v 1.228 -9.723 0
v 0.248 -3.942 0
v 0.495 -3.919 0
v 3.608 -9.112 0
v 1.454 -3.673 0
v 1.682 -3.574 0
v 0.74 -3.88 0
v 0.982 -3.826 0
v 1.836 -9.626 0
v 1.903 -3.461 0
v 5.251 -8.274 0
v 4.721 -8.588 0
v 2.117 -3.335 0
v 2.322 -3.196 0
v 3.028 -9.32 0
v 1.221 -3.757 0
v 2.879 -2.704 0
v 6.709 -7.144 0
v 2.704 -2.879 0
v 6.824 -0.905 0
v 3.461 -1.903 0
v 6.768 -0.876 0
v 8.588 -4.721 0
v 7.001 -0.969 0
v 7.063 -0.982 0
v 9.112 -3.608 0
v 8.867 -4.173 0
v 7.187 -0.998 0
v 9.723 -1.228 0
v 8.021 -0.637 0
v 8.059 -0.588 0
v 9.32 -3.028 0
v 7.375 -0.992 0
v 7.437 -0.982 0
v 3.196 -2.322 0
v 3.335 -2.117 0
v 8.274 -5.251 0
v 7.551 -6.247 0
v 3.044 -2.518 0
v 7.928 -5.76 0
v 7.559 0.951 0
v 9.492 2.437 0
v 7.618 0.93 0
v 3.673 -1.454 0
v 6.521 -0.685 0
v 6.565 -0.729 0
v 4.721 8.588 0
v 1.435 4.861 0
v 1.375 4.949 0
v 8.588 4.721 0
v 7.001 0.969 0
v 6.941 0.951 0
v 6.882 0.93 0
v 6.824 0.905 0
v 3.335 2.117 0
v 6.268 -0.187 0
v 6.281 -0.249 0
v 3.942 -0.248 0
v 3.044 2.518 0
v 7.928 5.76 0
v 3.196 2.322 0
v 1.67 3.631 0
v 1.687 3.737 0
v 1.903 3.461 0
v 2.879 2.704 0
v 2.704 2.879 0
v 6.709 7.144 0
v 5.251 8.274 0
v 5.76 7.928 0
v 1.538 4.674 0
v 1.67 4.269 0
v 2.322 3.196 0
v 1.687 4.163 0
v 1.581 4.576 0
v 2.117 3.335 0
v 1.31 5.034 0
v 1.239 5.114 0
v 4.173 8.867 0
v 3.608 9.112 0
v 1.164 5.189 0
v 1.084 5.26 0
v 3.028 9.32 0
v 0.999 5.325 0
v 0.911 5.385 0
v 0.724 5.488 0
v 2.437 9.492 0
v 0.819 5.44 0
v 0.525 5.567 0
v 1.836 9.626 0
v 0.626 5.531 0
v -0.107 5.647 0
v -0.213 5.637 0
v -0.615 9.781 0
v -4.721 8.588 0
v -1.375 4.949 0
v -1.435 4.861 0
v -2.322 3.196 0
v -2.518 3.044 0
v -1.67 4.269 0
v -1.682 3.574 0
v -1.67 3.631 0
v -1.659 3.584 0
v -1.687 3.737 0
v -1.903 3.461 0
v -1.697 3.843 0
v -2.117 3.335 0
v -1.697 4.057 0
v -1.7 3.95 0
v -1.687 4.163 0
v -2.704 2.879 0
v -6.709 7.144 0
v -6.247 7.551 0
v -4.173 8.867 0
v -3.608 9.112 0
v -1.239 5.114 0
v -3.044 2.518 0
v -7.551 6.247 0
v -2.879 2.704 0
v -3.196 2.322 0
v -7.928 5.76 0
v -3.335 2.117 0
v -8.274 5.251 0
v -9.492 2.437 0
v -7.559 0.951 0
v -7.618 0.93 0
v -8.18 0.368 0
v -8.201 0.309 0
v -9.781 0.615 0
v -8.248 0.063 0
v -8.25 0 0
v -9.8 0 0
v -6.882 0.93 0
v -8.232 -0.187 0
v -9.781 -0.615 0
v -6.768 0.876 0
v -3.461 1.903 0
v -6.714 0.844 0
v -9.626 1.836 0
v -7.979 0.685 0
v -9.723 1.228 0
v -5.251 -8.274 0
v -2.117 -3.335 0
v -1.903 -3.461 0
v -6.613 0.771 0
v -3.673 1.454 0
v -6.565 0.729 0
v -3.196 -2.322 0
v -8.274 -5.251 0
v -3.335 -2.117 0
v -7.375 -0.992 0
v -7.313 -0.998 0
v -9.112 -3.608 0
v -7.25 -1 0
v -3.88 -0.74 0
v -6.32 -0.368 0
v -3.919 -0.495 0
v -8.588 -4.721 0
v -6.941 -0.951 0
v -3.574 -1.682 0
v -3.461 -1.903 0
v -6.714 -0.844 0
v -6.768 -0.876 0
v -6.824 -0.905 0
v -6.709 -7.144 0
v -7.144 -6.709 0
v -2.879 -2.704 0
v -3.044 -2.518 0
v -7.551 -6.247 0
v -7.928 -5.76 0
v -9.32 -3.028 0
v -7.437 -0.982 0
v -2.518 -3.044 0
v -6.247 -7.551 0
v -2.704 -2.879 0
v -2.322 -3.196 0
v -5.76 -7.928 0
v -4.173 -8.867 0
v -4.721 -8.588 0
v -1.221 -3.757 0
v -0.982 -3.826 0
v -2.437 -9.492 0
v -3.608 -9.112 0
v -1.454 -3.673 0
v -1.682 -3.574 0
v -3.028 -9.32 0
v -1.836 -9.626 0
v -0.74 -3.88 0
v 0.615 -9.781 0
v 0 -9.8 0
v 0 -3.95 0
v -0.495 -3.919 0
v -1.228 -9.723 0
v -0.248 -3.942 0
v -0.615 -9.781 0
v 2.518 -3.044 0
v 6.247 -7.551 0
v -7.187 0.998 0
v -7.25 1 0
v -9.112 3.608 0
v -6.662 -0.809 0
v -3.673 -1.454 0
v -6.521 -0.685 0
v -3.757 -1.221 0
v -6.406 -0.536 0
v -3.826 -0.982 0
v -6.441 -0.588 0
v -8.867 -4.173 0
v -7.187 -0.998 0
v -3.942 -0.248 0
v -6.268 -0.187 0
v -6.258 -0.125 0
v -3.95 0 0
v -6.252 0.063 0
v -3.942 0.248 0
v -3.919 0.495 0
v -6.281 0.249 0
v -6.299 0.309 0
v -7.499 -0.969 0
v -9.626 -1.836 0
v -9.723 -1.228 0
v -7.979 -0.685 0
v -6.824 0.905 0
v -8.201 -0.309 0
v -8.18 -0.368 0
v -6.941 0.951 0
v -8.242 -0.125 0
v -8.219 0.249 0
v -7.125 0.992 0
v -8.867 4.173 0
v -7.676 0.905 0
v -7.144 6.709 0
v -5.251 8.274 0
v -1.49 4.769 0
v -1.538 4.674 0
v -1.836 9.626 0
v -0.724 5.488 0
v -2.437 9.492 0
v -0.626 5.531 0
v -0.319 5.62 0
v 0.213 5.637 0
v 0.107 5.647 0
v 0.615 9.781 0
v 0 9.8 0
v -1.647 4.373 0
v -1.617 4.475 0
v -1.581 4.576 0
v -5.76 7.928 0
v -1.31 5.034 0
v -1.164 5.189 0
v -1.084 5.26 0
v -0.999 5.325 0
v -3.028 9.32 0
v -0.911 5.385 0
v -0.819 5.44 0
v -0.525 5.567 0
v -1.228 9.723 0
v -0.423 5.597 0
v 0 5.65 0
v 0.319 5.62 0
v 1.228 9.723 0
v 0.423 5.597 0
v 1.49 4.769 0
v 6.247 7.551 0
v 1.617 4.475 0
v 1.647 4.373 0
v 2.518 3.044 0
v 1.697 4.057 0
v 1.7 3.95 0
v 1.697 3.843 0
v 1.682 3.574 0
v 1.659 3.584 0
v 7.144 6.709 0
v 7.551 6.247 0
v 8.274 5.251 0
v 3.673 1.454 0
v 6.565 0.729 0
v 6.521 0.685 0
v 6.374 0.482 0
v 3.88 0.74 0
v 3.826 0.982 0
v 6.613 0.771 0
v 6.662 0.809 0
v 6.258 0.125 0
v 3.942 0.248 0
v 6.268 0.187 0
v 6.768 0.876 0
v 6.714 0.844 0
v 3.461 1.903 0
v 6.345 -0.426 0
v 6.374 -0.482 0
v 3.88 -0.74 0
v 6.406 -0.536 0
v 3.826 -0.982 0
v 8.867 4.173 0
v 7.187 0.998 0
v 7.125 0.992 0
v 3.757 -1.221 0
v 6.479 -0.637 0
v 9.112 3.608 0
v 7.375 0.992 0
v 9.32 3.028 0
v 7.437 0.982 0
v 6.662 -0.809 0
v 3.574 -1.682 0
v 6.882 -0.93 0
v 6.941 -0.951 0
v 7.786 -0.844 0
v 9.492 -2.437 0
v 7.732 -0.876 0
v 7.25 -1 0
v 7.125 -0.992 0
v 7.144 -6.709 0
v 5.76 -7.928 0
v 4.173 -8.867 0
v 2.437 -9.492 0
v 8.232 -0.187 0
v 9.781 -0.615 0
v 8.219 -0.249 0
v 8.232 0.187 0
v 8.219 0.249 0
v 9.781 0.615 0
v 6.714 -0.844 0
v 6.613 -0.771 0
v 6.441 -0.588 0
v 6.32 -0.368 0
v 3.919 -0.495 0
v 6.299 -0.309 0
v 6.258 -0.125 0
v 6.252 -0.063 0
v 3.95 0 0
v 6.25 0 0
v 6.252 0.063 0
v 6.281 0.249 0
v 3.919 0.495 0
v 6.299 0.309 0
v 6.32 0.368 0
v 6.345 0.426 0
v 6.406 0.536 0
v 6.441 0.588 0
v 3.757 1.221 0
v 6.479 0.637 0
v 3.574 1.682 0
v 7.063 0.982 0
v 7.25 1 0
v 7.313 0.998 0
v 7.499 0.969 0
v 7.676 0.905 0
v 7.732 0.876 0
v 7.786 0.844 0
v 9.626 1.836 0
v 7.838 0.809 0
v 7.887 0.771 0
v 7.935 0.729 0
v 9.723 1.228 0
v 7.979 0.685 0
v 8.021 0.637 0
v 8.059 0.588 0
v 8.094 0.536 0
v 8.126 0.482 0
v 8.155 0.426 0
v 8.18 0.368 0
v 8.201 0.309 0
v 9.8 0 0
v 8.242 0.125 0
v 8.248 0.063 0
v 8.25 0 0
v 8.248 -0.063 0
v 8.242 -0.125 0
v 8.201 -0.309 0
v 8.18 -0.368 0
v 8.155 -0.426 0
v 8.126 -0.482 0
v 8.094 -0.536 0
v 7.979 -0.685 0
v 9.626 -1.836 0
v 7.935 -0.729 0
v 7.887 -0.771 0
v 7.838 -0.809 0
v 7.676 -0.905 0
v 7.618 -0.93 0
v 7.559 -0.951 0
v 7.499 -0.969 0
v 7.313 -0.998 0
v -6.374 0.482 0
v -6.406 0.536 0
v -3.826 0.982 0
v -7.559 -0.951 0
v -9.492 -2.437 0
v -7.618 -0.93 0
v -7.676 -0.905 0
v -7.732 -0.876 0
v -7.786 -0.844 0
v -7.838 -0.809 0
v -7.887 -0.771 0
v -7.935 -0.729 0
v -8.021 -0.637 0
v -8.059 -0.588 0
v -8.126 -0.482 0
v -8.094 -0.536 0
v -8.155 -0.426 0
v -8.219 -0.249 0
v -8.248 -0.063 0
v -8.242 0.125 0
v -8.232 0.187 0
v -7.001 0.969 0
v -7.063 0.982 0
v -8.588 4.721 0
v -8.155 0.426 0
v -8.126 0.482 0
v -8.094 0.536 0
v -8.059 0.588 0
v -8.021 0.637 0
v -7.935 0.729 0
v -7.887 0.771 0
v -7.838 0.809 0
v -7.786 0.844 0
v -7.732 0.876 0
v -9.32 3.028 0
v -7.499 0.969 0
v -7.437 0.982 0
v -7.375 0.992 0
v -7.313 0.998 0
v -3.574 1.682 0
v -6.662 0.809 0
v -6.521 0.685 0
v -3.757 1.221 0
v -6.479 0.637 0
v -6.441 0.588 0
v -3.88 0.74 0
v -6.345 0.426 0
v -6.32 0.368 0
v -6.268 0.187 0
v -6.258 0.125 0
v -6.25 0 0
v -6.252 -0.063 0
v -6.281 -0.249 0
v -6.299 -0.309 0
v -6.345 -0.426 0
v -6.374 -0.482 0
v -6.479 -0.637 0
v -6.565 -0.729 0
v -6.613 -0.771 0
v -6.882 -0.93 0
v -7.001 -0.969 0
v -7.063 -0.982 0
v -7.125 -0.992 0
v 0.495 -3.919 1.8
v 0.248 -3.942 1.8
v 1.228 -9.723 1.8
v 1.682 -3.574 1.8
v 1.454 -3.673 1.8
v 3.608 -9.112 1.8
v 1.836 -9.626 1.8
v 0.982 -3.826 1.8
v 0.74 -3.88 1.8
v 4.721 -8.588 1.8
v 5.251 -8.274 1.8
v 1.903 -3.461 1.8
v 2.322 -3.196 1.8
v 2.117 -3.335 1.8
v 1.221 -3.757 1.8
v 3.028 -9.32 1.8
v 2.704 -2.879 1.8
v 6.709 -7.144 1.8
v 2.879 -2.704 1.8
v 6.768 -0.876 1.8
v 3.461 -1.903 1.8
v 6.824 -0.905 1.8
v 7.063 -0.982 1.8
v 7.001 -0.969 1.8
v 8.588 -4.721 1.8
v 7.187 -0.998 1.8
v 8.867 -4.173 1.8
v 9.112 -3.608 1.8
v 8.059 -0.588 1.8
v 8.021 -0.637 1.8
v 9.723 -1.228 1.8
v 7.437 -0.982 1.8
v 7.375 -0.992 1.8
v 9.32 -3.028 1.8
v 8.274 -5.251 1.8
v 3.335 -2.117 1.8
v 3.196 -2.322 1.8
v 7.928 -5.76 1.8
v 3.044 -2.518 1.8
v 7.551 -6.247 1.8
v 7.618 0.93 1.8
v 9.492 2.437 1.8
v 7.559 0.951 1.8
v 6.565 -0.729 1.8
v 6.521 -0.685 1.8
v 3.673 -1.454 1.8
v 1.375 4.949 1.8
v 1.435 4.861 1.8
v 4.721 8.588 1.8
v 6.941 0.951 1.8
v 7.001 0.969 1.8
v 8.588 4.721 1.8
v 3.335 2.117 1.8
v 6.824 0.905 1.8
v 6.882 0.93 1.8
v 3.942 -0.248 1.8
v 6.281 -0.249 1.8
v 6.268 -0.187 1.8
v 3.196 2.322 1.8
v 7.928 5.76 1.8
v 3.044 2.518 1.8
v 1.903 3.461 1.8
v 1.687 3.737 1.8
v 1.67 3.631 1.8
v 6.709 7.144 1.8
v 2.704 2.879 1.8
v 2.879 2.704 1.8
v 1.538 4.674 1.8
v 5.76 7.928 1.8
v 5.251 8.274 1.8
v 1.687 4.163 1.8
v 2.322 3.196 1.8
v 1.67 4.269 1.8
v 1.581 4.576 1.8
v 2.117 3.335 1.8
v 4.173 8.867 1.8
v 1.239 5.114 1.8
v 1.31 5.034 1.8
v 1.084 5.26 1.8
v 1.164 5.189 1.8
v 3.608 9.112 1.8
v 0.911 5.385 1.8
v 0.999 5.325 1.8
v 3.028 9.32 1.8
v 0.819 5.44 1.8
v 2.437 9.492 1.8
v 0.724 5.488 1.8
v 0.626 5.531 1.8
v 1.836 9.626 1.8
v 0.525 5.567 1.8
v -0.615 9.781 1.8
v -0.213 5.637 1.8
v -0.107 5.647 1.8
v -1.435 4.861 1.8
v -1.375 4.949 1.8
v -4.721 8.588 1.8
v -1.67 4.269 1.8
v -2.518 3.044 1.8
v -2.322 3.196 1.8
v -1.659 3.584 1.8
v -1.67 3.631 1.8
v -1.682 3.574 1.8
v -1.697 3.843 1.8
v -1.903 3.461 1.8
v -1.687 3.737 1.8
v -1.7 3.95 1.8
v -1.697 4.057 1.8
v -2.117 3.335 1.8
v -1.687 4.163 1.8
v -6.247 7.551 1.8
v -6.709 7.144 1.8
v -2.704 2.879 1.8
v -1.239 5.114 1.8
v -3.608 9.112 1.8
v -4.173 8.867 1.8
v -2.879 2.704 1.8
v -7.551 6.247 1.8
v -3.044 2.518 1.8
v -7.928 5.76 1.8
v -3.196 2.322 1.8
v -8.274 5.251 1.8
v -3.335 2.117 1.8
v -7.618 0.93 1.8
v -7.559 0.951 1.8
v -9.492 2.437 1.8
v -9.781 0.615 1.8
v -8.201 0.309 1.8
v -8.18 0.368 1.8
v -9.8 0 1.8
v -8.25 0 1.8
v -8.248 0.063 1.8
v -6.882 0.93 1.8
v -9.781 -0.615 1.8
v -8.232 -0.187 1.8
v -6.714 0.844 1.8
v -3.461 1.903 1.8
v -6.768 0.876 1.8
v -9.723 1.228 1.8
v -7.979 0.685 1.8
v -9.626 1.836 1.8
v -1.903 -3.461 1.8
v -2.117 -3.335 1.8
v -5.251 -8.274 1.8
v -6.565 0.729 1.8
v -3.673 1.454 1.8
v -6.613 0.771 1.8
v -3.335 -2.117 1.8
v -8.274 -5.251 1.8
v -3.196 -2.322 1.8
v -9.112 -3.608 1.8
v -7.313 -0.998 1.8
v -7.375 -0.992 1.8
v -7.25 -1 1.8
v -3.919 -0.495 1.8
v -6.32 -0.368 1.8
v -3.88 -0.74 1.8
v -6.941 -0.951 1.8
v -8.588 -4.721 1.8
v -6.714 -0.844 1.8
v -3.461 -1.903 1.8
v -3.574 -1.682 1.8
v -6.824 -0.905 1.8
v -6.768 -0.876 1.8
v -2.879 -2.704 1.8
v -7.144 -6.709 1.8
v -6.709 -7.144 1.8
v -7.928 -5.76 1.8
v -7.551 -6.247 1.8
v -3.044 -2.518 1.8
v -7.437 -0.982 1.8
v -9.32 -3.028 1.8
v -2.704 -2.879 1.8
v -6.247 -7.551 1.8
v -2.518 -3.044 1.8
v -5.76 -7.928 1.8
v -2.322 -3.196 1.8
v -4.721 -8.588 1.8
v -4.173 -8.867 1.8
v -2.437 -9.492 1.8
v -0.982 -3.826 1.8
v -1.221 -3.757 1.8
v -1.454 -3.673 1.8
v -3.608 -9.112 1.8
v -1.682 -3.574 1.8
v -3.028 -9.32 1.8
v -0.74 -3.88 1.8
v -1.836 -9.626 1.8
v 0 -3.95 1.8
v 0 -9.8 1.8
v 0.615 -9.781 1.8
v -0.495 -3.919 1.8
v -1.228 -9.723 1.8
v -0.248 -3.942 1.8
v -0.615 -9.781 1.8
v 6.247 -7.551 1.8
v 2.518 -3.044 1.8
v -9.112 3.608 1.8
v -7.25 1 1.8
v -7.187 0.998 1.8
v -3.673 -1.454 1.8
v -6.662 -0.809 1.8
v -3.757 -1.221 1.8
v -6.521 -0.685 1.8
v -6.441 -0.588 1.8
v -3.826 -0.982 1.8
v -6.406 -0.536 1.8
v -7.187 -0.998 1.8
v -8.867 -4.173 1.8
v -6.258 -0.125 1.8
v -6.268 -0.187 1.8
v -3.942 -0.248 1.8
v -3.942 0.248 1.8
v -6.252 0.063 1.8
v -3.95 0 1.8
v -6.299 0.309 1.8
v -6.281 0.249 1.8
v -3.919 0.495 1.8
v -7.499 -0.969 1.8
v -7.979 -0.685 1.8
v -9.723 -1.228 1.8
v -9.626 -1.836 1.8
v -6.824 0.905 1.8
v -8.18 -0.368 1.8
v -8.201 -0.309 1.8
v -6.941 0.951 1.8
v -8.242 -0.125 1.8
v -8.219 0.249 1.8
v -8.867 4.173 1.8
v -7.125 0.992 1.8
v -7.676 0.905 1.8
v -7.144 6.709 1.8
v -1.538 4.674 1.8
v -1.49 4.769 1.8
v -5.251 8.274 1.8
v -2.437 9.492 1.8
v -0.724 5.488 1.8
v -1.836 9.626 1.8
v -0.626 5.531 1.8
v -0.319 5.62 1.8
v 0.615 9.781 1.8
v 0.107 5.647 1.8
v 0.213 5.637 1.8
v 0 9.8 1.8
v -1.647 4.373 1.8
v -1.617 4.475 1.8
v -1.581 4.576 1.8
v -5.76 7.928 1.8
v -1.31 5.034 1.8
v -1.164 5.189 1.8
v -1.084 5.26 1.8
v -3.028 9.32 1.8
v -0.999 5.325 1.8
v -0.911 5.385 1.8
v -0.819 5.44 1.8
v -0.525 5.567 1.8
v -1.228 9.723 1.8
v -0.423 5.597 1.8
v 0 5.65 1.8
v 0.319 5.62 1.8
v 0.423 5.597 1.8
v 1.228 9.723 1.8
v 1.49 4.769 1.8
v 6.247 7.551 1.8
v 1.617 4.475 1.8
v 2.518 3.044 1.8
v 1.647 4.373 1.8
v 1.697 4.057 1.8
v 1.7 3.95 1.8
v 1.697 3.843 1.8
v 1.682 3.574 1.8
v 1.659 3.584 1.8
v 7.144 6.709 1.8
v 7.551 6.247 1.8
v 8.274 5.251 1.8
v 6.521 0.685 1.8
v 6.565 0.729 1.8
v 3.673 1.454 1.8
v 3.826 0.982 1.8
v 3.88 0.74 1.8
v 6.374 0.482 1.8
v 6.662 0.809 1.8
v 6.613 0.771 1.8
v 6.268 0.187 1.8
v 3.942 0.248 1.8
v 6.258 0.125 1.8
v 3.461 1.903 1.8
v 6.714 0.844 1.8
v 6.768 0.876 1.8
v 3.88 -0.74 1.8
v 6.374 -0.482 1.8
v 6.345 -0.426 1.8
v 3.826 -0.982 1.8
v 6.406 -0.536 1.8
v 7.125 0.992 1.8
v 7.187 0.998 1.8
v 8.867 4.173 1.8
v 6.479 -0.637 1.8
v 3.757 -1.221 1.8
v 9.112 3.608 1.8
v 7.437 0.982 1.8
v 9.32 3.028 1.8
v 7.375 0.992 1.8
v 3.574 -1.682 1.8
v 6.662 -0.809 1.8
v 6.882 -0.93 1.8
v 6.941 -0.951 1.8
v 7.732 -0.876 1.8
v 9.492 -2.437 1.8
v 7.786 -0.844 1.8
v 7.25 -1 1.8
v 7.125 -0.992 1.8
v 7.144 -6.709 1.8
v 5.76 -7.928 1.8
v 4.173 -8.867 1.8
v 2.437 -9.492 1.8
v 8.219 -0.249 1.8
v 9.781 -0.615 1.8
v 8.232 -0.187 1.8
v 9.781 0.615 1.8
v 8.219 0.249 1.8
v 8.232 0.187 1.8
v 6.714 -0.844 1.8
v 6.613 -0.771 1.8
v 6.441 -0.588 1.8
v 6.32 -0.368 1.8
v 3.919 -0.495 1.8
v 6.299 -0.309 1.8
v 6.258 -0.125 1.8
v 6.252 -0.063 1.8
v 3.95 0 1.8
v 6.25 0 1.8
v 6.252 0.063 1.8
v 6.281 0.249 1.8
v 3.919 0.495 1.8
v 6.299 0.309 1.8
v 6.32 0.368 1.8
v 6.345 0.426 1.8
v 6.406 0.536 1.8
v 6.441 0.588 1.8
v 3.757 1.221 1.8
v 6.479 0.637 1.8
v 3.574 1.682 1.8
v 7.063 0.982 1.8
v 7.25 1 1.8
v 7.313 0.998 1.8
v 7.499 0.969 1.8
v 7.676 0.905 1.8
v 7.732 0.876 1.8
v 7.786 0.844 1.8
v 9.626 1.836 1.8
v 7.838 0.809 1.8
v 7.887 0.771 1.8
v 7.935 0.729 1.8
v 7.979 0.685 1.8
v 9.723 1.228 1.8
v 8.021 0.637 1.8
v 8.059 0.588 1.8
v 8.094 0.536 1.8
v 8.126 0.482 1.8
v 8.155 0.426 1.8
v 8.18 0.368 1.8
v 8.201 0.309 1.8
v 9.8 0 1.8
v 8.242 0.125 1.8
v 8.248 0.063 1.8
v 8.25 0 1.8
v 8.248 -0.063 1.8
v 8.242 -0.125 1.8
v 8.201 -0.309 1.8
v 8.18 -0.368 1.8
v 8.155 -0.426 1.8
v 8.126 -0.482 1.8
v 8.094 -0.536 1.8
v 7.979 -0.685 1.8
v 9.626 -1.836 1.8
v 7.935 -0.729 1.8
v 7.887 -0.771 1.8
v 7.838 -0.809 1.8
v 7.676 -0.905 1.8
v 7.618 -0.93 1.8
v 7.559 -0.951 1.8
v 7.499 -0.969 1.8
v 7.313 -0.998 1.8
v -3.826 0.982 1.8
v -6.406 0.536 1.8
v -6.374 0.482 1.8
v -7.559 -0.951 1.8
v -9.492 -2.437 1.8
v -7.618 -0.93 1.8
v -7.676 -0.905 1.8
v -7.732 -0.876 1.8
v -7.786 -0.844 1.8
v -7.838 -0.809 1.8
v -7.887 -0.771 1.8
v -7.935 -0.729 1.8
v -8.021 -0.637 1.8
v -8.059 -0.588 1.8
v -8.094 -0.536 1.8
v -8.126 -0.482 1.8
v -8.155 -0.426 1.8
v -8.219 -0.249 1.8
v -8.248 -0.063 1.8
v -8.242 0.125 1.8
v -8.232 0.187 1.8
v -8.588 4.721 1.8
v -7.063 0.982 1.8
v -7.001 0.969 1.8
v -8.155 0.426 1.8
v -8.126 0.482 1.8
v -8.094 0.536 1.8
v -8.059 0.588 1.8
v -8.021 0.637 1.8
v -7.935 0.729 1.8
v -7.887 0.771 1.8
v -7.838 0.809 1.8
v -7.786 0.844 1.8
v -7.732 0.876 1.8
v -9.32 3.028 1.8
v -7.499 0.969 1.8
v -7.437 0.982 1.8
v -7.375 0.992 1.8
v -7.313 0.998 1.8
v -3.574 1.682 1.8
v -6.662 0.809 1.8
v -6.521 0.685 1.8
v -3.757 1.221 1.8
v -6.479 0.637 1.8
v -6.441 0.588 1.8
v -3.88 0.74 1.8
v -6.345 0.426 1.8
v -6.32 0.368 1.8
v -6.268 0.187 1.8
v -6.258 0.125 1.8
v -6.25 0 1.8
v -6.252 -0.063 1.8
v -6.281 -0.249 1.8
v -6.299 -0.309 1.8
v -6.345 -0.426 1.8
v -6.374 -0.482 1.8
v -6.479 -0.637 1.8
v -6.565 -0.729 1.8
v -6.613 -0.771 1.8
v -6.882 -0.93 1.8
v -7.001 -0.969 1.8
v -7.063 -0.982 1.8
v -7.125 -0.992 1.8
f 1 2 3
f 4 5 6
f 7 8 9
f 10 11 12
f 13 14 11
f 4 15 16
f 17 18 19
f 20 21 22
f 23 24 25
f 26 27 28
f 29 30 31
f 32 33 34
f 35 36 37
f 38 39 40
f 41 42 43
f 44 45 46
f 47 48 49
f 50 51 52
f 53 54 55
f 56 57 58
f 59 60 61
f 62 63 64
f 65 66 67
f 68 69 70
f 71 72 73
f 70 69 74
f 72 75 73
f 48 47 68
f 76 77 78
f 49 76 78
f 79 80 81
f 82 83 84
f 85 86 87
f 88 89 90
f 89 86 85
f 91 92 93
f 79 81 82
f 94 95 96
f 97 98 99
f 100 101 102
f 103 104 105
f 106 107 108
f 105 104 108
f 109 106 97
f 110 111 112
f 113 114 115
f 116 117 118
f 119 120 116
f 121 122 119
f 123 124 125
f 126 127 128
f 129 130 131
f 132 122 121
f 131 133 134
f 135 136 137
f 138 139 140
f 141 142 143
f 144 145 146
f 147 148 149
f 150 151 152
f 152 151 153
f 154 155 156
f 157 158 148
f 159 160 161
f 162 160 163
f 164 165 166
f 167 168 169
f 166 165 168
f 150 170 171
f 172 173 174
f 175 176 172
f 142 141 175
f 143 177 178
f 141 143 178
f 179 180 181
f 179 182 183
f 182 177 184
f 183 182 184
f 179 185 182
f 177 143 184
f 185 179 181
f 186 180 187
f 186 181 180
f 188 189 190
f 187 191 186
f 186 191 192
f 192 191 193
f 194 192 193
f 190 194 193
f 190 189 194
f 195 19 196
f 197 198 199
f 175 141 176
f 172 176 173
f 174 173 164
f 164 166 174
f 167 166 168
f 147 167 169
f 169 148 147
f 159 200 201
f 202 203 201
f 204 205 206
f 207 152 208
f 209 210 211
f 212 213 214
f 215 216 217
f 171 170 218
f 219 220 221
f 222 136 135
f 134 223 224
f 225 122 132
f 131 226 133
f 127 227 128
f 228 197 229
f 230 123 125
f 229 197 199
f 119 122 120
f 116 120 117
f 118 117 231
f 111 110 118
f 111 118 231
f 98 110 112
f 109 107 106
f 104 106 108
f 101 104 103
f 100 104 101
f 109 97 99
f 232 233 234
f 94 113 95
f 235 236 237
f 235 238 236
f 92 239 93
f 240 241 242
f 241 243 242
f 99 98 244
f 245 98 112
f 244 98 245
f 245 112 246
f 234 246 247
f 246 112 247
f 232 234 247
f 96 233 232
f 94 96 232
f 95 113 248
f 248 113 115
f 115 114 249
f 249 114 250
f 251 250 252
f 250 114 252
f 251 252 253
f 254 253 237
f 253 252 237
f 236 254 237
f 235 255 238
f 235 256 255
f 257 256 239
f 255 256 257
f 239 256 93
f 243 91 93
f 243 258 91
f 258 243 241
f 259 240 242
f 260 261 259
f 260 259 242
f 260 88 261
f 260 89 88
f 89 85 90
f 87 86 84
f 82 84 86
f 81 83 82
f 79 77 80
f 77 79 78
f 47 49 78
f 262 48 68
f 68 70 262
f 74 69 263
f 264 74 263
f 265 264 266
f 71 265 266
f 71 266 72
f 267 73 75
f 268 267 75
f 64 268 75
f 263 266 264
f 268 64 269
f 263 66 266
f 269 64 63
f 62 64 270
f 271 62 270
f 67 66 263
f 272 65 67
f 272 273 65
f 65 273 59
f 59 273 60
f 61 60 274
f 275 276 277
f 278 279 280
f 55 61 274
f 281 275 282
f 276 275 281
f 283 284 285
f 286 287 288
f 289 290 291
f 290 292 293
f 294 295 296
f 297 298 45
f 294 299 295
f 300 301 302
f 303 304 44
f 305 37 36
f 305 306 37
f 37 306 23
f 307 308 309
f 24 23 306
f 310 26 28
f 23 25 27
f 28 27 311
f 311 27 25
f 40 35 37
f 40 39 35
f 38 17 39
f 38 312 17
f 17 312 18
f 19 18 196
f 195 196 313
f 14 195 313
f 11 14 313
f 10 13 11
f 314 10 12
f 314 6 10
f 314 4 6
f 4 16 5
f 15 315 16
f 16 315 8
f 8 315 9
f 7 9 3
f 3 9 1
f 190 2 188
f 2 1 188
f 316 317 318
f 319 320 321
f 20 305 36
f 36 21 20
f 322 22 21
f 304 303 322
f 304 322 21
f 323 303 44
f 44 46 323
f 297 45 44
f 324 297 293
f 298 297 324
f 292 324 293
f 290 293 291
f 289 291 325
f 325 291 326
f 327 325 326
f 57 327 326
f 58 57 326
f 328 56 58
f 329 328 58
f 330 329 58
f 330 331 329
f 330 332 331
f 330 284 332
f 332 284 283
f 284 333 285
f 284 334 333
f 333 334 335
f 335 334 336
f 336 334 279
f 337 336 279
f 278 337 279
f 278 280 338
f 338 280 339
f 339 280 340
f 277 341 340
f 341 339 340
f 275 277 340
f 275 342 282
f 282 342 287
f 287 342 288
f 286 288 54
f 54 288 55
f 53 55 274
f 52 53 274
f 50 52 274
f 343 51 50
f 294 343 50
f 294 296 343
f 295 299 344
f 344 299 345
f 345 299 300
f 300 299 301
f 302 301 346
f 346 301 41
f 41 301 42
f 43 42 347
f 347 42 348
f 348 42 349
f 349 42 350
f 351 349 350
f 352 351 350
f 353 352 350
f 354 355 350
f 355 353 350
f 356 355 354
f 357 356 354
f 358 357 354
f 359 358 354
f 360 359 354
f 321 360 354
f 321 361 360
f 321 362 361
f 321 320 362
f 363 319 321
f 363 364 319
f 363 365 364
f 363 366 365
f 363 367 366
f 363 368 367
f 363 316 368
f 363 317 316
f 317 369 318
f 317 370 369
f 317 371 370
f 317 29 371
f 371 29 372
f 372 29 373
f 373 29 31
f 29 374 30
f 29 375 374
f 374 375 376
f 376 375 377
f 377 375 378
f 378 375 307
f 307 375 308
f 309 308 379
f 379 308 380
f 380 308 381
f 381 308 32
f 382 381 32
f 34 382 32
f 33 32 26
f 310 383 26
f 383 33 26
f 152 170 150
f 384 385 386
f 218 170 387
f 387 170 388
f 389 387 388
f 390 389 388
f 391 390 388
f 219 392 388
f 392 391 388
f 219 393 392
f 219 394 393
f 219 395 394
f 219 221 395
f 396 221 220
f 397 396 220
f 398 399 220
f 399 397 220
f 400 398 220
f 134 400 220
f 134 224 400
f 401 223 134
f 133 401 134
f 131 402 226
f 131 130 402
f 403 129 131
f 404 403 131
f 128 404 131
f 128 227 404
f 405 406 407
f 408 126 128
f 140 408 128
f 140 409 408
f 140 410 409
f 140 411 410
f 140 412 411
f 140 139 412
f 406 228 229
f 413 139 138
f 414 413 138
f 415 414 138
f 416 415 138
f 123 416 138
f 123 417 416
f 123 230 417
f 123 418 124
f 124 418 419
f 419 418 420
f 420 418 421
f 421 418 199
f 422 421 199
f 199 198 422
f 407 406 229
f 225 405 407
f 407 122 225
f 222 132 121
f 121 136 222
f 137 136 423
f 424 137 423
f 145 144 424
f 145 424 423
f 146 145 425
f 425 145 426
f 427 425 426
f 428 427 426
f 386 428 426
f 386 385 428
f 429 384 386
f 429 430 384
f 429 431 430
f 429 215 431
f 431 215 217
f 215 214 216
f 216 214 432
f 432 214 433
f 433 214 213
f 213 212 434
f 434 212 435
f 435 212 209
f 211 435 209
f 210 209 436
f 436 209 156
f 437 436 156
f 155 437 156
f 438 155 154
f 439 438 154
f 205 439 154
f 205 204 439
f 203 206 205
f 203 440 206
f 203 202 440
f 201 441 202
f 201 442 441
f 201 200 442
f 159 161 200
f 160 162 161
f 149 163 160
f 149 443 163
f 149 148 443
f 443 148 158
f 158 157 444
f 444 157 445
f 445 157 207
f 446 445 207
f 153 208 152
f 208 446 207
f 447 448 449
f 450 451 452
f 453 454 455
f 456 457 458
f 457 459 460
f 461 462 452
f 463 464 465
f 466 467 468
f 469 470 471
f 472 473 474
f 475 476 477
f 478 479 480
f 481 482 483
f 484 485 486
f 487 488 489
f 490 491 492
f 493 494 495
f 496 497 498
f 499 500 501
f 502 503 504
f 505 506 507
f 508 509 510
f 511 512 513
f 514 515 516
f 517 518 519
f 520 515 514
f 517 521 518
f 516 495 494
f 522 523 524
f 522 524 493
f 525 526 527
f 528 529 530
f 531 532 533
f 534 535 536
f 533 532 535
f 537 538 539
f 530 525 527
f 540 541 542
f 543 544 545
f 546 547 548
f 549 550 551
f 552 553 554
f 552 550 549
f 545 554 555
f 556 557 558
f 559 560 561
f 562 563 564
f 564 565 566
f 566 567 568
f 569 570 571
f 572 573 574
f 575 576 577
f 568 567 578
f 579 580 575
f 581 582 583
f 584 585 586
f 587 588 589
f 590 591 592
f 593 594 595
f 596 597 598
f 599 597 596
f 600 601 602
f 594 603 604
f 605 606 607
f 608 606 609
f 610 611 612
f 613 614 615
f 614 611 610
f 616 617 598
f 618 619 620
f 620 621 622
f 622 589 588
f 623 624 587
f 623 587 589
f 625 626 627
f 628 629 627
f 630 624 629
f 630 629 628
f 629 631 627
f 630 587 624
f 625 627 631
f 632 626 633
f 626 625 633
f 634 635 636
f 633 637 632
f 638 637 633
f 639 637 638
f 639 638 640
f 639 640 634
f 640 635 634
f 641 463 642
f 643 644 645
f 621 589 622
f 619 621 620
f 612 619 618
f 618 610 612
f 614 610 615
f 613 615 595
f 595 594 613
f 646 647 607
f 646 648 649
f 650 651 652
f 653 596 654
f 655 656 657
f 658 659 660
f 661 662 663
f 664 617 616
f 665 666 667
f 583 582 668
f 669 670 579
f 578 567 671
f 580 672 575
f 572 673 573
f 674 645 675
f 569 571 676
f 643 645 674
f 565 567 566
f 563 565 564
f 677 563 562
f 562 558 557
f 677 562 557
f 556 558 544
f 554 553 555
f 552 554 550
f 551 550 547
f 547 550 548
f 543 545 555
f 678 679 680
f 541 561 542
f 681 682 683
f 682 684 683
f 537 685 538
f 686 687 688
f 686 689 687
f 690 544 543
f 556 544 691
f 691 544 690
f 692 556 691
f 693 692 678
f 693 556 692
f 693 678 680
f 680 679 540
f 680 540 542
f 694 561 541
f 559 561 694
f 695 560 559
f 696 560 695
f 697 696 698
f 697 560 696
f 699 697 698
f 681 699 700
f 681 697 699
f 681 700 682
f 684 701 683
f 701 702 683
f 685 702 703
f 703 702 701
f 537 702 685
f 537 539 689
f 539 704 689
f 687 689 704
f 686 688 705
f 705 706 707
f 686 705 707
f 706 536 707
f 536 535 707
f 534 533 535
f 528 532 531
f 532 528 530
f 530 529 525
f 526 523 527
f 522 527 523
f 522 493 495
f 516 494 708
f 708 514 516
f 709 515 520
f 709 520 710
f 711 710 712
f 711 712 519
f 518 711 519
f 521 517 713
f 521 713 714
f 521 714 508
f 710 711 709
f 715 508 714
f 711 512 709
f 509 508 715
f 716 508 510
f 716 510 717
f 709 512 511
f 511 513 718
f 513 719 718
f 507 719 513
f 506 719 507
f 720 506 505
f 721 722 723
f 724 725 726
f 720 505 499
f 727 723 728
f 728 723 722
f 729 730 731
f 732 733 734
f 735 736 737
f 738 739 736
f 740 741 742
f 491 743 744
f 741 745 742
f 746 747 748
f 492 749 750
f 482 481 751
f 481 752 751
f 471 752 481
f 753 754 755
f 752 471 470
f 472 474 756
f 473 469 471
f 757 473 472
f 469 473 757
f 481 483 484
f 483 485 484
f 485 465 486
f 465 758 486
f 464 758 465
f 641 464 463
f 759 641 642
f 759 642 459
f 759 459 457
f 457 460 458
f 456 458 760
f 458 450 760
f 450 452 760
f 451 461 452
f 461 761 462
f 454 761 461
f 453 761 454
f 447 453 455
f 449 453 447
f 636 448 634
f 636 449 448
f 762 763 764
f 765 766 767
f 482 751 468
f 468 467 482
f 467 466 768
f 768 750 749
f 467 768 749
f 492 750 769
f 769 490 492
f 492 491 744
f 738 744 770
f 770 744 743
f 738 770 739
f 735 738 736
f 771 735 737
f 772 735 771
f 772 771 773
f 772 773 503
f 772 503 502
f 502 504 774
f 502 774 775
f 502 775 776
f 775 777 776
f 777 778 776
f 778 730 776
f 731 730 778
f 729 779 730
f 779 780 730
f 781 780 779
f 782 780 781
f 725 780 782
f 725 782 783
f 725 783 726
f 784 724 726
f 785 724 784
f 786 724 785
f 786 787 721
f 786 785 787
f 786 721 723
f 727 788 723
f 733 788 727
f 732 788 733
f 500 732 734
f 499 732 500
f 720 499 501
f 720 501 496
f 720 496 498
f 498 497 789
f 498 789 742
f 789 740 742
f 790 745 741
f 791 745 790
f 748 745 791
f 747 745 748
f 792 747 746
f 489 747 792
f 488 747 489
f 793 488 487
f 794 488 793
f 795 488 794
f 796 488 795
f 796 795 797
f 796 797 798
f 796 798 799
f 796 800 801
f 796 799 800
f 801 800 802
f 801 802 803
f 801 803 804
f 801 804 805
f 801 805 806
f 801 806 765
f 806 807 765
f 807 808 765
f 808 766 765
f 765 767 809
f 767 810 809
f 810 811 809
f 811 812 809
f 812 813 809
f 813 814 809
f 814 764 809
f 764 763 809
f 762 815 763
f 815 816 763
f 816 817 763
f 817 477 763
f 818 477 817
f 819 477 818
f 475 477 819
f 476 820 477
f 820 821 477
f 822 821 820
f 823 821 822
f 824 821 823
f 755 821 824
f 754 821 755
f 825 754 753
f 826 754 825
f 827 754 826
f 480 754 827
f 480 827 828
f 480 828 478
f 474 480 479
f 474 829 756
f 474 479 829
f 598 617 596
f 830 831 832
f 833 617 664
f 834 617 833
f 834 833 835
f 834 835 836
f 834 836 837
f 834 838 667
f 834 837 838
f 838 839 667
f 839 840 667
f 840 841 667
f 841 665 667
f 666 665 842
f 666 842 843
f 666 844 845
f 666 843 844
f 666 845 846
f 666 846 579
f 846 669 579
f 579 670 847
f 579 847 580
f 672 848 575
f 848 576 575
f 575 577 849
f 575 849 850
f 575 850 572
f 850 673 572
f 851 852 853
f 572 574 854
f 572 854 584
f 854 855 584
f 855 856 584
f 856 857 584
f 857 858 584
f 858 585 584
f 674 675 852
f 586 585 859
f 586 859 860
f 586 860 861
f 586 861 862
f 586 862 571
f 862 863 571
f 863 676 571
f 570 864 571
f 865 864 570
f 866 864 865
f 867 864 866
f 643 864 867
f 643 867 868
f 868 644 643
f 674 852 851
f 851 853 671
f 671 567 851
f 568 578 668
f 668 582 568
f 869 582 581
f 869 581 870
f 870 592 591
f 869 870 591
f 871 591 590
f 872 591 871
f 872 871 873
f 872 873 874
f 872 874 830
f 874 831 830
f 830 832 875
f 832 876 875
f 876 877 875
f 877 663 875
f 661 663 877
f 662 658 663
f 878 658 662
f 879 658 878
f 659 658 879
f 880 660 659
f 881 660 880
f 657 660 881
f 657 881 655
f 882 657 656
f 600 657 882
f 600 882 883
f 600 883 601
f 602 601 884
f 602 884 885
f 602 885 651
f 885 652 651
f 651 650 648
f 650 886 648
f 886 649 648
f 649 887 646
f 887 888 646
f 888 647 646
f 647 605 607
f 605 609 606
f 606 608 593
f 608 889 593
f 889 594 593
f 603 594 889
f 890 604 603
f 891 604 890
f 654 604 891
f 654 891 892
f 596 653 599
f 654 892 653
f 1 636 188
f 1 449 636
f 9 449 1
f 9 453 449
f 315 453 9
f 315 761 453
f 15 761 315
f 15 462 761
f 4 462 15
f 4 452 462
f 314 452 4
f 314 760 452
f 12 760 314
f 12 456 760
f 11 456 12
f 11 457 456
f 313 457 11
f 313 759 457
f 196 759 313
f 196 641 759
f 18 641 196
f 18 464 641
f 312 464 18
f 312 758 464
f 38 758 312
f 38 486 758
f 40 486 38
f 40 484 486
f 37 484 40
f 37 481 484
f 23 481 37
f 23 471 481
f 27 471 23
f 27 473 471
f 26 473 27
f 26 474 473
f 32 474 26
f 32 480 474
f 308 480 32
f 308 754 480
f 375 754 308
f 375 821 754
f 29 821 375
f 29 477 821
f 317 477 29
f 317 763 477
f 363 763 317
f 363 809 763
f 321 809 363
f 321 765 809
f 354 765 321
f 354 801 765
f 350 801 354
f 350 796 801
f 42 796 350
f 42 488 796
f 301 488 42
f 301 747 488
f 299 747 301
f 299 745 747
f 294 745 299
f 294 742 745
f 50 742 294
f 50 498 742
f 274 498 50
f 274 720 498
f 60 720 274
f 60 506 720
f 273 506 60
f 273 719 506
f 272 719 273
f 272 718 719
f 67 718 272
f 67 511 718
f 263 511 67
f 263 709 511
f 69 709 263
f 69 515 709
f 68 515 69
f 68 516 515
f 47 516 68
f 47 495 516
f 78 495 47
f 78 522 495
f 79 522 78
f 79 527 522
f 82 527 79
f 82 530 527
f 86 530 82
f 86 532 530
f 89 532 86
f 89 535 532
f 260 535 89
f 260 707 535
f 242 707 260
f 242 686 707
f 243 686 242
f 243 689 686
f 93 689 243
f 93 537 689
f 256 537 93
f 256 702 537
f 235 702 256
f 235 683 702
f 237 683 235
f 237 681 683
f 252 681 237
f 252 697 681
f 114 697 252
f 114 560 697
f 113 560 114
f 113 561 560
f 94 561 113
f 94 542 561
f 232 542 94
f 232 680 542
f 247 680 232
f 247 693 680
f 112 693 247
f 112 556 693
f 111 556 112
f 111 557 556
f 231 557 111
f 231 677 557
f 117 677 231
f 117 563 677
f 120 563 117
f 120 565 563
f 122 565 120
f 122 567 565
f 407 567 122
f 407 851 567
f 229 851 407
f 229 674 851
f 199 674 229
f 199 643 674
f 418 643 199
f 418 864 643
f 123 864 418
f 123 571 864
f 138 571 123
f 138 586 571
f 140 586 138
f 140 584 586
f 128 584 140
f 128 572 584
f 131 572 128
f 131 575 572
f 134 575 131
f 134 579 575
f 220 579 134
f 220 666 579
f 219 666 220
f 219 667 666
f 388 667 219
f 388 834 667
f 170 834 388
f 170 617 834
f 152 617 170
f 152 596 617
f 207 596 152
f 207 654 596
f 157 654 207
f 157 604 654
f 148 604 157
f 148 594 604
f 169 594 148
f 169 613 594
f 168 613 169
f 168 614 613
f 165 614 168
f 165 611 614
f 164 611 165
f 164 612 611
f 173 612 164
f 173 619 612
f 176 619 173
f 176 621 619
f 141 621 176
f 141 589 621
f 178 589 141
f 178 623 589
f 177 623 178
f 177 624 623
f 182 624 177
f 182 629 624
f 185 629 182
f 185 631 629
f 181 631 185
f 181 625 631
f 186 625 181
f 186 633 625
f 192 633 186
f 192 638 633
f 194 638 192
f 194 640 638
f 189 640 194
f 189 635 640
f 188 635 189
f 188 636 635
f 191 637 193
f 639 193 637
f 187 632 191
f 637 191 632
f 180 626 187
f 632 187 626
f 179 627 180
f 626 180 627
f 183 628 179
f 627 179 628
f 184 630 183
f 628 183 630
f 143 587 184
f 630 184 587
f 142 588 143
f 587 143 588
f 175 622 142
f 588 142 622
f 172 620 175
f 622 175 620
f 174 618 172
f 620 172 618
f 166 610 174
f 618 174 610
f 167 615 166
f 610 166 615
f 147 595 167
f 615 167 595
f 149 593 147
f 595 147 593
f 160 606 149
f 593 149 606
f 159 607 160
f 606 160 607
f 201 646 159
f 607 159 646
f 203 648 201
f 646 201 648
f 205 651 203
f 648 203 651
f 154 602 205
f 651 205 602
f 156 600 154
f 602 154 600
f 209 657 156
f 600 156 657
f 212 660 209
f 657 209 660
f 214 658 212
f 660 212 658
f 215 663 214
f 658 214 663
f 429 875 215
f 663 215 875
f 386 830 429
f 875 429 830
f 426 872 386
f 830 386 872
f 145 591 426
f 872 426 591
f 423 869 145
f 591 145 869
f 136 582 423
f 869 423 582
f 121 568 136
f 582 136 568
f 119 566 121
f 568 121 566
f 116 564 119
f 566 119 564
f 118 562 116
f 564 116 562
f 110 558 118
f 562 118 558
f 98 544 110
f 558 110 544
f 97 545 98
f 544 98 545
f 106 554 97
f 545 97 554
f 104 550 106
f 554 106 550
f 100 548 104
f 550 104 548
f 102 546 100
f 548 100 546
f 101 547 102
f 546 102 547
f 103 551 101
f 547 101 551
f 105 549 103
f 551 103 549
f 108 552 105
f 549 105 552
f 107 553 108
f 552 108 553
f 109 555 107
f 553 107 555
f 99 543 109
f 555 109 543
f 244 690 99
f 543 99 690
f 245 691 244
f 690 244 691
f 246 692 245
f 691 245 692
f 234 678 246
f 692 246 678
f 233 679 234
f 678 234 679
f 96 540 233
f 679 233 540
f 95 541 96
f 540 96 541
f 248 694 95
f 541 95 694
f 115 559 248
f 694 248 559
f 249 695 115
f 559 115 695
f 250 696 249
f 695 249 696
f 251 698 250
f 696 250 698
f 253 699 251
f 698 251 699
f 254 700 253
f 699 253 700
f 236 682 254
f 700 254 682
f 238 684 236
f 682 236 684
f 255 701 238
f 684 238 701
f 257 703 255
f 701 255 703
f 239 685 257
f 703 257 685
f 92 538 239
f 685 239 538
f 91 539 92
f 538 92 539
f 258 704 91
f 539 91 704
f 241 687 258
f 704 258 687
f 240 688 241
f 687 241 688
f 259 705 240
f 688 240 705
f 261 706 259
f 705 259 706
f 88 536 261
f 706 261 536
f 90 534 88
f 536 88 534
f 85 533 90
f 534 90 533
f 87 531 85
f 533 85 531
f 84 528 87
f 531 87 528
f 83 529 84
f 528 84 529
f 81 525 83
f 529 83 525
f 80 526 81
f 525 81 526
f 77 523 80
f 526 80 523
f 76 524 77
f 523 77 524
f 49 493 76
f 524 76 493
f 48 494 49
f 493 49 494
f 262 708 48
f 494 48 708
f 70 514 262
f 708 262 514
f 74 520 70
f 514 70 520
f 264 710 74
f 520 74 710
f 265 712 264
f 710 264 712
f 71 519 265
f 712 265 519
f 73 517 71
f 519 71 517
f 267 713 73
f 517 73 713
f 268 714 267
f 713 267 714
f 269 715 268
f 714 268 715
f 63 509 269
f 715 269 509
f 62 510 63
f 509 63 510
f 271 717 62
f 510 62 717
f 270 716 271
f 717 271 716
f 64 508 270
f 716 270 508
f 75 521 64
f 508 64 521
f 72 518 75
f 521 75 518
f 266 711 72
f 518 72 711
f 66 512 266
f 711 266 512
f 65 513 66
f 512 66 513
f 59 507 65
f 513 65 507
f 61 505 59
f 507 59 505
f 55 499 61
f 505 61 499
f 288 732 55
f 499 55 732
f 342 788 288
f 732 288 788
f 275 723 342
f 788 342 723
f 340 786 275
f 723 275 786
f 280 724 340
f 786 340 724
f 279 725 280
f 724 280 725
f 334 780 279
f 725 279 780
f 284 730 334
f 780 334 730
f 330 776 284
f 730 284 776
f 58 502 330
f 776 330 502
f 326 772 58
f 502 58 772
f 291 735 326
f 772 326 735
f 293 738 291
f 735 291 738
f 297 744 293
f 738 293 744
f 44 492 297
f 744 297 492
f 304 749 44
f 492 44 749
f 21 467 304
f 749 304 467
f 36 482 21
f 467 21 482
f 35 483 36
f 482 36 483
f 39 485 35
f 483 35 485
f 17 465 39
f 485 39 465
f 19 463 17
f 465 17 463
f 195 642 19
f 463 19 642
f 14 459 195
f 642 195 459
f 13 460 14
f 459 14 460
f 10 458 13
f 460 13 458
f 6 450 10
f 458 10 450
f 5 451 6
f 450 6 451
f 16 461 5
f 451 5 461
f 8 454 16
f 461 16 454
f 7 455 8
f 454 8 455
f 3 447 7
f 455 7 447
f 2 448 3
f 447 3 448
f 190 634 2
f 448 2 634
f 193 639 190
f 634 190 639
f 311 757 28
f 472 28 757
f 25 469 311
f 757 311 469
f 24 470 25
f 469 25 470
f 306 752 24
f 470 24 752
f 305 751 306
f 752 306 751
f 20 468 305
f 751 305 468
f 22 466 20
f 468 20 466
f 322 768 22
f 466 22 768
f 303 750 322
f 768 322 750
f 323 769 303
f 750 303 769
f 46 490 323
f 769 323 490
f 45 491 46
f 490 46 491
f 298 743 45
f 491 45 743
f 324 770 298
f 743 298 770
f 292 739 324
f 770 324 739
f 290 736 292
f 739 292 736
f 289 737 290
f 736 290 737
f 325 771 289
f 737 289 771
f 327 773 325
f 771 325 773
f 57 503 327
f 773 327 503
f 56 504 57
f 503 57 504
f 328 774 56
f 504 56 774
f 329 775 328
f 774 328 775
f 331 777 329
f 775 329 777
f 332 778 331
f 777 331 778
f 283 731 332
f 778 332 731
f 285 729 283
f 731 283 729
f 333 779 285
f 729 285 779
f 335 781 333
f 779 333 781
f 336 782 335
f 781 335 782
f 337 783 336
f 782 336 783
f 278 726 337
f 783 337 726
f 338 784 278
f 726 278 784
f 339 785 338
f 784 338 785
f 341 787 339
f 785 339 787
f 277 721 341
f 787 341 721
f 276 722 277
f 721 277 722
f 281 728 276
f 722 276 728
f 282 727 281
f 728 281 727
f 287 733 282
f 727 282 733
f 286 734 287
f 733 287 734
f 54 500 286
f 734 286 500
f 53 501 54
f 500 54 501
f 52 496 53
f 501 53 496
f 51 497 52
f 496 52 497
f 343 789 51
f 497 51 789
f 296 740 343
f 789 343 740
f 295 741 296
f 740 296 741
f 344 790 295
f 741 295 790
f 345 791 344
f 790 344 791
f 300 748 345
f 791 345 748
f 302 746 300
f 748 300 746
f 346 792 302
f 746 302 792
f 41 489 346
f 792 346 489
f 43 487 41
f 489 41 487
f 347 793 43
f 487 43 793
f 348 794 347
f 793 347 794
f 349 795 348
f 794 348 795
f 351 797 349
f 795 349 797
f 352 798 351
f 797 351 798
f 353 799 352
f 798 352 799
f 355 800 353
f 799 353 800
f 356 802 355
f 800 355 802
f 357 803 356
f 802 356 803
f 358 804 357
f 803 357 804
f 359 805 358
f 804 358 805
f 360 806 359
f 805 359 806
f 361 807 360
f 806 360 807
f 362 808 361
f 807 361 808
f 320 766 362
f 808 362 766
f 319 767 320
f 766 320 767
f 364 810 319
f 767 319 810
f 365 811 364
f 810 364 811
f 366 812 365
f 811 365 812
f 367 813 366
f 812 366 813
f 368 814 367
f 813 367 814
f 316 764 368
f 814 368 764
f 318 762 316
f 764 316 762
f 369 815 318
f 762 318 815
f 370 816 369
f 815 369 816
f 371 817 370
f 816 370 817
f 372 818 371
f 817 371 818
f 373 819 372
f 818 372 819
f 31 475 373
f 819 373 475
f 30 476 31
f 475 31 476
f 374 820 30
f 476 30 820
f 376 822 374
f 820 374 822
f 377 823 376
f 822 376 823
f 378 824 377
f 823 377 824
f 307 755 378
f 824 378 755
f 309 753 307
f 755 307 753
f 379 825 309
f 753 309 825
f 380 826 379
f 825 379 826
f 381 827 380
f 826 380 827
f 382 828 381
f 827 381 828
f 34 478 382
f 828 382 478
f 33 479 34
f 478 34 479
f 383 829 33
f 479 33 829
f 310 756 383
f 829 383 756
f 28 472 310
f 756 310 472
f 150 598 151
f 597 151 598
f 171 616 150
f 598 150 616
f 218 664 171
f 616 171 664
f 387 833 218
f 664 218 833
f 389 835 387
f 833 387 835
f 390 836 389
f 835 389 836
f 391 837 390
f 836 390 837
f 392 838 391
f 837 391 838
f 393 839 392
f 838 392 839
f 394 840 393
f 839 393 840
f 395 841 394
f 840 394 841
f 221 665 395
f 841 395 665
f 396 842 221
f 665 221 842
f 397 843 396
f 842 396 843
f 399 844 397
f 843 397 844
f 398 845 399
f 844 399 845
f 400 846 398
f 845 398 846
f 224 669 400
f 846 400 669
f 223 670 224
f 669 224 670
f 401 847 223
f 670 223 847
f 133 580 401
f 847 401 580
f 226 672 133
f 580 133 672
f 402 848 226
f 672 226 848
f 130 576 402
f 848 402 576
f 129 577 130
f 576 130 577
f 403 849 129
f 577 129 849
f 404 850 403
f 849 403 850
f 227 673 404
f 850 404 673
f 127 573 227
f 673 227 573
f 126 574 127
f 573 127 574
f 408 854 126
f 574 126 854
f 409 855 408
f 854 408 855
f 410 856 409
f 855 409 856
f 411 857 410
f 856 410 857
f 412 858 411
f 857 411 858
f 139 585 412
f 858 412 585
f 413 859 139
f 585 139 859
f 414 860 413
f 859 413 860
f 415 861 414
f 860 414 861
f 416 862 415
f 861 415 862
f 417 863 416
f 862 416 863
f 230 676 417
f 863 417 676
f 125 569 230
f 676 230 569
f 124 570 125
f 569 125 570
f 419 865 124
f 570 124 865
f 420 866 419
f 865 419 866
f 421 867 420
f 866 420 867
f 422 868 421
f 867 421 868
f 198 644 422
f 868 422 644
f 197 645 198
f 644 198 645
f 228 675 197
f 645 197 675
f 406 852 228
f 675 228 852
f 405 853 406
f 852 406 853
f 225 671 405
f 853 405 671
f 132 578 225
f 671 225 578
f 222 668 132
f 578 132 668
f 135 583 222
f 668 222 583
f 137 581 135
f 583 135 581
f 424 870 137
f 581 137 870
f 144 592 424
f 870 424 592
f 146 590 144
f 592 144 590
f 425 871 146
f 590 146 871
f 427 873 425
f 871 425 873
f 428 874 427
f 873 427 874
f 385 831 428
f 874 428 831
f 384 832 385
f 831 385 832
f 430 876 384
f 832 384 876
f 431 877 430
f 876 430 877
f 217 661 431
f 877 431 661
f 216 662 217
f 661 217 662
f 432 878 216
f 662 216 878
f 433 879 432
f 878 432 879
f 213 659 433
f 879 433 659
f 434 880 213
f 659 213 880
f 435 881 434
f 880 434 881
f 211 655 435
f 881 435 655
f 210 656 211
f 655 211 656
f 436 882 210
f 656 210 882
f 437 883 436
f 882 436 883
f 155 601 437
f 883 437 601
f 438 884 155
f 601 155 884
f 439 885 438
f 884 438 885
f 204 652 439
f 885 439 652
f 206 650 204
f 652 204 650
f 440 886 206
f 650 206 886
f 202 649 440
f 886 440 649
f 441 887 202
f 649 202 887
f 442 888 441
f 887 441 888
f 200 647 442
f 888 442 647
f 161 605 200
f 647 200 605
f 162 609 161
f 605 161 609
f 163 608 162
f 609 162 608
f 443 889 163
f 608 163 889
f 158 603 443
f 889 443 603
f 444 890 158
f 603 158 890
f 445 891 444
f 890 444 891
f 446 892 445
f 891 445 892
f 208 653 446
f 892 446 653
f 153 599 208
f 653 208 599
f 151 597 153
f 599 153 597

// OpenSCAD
/*
 * Bracket for mounting magnetic knife rack
 *
 * 2020-05-11
 *
 */

$fn = 100;
tolerance               = 0.4;

screw_diameter          = 3 + tolerance;
screw_head_diameter     = 7.5 + tolerance;

mount_width             = 20 - tolerance;
mount_depth             = 2.2 - tolerance;

incut_width             = 8.25 - tolerance;
incut_depth             = 4.5 - tolerance;




linear_extrude(mount_depth) {
    difference() {
        
        //Bracket Size
        circle(d = mount_width);
        
        // Hole for screw to mount on to
        circle(d = screw_head_diameter);
        translate([0,screw_head_diameter/2,0]) circle(d=screw_diameter);
        
        // Holes for screws to mount to knife rack
        translate([7.25, 0, 0]) circle(d=2);
        translate([-7.25, 0, 0]) circle(d=2);
    } 
}
